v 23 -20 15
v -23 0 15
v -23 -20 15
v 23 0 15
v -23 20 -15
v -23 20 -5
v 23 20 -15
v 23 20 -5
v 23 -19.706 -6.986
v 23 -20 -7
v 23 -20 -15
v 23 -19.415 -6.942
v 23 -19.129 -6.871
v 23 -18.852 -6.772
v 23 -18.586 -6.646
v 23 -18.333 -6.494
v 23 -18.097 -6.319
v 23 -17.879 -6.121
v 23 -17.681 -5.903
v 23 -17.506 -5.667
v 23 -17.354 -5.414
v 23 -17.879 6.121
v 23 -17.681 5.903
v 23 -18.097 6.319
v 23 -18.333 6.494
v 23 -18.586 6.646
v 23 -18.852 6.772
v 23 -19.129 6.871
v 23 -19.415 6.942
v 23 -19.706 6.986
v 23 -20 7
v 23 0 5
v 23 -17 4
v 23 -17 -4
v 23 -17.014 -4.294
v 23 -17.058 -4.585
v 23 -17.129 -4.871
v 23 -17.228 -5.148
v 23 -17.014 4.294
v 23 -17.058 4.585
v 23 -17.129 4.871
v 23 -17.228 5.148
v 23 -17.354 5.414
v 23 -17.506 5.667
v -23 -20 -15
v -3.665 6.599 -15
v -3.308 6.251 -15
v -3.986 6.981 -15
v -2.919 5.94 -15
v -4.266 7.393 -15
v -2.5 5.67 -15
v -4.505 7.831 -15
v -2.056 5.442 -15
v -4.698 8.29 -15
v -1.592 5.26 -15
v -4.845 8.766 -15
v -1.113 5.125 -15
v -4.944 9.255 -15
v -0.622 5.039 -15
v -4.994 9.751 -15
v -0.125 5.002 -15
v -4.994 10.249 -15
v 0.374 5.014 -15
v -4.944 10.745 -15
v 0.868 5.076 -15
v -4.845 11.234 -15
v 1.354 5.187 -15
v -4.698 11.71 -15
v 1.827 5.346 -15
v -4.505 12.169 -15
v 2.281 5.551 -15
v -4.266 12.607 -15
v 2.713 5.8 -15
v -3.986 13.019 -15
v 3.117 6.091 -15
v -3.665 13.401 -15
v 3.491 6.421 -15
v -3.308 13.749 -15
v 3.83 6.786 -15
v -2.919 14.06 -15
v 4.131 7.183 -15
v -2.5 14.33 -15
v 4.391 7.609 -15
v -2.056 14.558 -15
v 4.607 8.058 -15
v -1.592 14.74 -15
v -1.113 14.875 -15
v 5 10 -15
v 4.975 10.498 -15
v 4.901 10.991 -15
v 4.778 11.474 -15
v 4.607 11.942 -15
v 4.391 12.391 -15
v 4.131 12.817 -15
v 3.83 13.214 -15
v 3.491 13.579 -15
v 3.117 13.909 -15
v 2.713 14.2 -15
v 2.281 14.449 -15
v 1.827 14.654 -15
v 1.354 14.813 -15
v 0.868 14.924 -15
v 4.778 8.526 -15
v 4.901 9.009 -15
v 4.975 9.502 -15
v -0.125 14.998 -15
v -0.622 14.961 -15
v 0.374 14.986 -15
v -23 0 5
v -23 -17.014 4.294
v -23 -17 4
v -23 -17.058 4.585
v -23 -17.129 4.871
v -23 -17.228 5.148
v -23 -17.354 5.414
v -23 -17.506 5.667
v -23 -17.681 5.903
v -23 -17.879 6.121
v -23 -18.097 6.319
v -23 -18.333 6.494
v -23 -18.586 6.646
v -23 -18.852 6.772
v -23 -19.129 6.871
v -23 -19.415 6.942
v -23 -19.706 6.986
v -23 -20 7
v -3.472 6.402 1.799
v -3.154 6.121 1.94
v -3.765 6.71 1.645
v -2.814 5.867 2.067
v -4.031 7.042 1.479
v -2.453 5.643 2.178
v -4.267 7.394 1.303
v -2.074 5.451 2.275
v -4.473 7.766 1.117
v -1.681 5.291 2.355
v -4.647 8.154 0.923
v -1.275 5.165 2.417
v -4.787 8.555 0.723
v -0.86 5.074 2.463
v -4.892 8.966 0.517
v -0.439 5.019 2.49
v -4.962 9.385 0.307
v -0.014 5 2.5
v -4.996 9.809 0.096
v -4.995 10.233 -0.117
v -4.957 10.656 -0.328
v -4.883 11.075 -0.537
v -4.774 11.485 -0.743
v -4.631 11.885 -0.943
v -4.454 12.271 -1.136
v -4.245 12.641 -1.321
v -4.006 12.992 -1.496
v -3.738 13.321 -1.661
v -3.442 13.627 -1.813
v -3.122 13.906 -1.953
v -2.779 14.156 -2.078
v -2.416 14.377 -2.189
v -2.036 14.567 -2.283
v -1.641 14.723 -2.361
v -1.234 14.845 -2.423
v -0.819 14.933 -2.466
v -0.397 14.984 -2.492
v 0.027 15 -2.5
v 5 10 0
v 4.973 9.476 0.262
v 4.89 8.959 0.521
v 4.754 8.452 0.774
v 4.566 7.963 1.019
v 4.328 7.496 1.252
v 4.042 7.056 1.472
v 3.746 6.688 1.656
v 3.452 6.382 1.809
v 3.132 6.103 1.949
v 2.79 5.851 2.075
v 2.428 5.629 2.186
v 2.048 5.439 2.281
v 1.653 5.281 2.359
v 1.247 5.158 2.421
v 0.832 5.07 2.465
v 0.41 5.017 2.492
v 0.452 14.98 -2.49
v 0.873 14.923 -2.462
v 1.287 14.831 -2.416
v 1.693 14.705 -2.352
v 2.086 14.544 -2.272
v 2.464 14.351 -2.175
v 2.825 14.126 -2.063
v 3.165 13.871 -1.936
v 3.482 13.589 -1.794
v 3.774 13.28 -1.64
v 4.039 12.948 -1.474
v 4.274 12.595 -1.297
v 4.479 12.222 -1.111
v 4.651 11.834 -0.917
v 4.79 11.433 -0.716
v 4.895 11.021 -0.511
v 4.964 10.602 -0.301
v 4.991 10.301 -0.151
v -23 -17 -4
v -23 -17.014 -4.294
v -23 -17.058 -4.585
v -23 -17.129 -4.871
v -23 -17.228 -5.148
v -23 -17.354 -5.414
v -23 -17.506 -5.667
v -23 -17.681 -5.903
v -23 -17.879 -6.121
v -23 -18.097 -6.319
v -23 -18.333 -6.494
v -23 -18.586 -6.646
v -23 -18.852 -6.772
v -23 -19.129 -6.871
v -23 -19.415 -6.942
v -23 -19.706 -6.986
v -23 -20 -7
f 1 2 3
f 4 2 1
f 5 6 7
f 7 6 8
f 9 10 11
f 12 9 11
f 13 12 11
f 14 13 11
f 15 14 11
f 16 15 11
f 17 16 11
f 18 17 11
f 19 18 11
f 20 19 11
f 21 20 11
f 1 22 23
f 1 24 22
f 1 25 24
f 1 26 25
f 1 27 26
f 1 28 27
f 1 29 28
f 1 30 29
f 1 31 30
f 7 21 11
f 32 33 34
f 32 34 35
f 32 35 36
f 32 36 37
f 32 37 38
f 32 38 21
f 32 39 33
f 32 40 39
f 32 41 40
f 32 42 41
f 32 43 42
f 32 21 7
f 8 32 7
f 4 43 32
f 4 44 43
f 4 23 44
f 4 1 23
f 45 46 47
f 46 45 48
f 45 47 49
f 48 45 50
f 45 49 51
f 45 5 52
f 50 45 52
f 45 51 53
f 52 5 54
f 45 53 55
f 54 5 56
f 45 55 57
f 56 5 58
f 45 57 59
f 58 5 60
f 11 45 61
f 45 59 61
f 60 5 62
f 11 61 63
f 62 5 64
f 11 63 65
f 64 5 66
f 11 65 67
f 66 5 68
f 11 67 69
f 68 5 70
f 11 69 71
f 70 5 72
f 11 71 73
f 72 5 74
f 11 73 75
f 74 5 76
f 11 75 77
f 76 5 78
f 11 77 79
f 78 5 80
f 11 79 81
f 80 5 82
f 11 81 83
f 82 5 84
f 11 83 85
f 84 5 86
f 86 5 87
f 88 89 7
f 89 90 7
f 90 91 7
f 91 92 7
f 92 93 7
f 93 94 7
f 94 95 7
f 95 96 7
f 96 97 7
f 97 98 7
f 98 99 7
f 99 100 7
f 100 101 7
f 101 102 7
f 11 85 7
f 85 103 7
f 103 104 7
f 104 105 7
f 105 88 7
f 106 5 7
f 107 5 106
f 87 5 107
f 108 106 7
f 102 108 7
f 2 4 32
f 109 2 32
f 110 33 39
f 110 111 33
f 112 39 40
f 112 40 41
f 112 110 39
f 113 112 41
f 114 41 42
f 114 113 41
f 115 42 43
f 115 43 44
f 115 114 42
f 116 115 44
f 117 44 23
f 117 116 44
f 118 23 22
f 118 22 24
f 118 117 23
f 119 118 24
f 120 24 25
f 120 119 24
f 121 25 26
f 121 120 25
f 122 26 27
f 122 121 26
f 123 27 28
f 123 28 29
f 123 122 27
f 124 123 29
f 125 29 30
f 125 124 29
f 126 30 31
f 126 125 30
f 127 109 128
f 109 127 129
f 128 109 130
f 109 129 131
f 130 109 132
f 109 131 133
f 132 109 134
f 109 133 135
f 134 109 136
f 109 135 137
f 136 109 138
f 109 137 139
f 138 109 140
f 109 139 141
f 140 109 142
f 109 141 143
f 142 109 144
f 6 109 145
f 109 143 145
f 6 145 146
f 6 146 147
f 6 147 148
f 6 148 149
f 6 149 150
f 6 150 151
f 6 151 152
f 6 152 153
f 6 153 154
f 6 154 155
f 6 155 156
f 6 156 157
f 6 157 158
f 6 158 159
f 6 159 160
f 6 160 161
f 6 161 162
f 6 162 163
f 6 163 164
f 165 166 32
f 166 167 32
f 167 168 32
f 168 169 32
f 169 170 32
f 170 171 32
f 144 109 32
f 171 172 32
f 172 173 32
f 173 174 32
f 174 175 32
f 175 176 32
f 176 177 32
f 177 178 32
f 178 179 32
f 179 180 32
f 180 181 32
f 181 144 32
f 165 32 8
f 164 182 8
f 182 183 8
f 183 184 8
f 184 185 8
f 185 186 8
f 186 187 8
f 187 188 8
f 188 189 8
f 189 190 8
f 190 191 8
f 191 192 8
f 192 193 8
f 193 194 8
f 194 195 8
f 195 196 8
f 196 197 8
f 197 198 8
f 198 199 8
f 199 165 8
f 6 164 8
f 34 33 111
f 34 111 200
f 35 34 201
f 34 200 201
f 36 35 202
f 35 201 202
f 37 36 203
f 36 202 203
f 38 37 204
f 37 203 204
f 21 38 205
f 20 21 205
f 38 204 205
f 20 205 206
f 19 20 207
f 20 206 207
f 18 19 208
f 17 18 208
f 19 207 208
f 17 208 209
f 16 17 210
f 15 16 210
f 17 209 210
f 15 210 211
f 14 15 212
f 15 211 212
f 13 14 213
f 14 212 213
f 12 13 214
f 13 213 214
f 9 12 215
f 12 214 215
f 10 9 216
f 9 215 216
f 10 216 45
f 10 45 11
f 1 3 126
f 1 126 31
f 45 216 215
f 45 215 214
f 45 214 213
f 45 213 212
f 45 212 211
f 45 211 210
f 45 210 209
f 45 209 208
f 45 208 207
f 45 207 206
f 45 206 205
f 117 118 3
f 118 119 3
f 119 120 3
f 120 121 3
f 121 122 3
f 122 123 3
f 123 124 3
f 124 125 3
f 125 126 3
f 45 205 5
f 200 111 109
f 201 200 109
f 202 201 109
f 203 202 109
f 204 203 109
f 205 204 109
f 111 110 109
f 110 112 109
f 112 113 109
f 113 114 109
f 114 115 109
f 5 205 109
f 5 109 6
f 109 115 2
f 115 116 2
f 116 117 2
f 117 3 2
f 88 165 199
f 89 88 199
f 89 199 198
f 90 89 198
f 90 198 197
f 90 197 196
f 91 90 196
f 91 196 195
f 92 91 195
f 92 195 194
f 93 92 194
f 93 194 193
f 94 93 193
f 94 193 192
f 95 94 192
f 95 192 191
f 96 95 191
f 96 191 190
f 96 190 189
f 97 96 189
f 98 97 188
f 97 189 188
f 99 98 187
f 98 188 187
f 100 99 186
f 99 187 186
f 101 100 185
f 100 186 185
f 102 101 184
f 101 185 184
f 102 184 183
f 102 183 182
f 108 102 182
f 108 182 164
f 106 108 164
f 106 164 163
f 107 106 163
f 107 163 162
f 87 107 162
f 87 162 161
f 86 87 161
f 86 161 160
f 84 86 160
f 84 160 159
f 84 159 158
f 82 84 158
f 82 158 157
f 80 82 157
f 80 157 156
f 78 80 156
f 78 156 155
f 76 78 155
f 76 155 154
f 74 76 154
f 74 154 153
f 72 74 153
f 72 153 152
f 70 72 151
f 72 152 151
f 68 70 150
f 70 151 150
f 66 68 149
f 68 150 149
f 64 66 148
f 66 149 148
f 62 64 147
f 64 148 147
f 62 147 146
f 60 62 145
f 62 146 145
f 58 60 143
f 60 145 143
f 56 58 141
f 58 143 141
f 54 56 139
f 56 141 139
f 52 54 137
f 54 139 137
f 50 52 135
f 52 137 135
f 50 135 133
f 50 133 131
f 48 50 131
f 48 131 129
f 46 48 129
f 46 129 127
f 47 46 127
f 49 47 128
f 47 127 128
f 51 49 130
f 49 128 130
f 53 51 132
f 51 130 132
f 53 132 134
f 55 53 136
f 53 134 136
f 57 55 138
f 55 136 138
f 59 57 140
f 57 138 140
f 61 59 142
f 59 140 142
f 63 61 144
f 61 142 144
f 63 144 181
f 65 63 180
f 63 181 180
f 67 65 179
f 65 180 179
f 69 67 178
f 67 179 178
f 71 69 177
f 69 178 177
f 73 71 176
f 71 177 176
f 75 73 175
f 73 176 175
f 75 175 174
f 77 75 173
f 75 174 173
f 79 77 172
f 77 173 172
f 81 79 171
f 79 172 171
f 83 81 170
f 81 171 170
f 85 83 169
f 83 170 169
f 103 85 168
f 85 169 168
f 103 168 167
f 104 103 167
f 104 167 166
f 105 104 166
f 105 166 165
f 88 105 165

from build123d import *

# Parameters (mm, degrees)
SKETCH_1_W          = 46
SKETCH_1_H          = 40
EXTRUDE_1_DEPTH     = 15
SKETCH_2_R          = 5
CUT_EXTRUDE_1_DEPTH = 43.766809561
SKETCH_4_W          = 14
SKETCH_4_H          = 3
CUT_EXTRUDE_2_DEPTH = 53.354560451
FILLET_3_R          = 3
FILLET_8_R          = 3
CUT_EXTRUDE_3_DEPTH = 53.354560451


with BuildPart() as part:
    # 草圖1 → 填料-伸長1 (new, symmetric)
    with BuildSketch(Plane.XY):
        Rectangle(SKETCH_1_W, SKETCH_1_H)
    extrude(amount=EXTRUDE_1_DEPTH, both=True)

    # 草圖2 → 除料-伸長1 (cut, through all)
    with BuildSketch(Plane.XY.offset(15)):
        with Locations((0, 10)):
            Circle(SKETCH_2_R)
    extrude(amount=-CUT_EXTRUDE_1_DEPTH, mode=Mode.SUBTRACT)

    # 草圖4 → 除料-伸長2 (cut, through all)
    with BuildSketch(Plane(origin=(23, 0, 0), x_dir=(0, 0, -1), z_dir=(1, 0, 0))):
        with Locations((0, -18.5)):
            Rectangle(SKETCH_4_W, SKETCH_4_H)
    extrude(amount=-CUT_EXTRUDE_2_DEPTH, mode=Mode.SUBTRACT)

    # 圓角3
    fillet_3_edges = [part.edges().sort_by_distance(p)[0] for p in [
        (0, -17, 7),
    ]]
    fillet(fillet_3_edges, radius=FILLET_3_R - 0.0001)  # a hair under: the kernel refuses the full size

    # 圓角8
    fillet_8_edges = [part.edges().sort_by_distance(p)[0] for p in [
        (0, -17, -7),
    ]]
    fillet(fillet_8_edges, radius=FILLET_8_R - 0.0001)  # a hair under: the kernel refuses the full size

    # 草圖5 → 除料-伸長3 (cut, through all)
    with BuildSketch(Plane(origin=(23, 0, 0), x_dir=(0, 0, -1), z_dir=(1, 0, 0))):
        Polygon((-5, 0), (5, 20), (-5, 20), (-15, 20), (-15, 0), align=None)
    extrude(amount=-CUT_EXTRUDE_3_DEPTH, mode=Mode.SUBTRACT)


solid = part.part
